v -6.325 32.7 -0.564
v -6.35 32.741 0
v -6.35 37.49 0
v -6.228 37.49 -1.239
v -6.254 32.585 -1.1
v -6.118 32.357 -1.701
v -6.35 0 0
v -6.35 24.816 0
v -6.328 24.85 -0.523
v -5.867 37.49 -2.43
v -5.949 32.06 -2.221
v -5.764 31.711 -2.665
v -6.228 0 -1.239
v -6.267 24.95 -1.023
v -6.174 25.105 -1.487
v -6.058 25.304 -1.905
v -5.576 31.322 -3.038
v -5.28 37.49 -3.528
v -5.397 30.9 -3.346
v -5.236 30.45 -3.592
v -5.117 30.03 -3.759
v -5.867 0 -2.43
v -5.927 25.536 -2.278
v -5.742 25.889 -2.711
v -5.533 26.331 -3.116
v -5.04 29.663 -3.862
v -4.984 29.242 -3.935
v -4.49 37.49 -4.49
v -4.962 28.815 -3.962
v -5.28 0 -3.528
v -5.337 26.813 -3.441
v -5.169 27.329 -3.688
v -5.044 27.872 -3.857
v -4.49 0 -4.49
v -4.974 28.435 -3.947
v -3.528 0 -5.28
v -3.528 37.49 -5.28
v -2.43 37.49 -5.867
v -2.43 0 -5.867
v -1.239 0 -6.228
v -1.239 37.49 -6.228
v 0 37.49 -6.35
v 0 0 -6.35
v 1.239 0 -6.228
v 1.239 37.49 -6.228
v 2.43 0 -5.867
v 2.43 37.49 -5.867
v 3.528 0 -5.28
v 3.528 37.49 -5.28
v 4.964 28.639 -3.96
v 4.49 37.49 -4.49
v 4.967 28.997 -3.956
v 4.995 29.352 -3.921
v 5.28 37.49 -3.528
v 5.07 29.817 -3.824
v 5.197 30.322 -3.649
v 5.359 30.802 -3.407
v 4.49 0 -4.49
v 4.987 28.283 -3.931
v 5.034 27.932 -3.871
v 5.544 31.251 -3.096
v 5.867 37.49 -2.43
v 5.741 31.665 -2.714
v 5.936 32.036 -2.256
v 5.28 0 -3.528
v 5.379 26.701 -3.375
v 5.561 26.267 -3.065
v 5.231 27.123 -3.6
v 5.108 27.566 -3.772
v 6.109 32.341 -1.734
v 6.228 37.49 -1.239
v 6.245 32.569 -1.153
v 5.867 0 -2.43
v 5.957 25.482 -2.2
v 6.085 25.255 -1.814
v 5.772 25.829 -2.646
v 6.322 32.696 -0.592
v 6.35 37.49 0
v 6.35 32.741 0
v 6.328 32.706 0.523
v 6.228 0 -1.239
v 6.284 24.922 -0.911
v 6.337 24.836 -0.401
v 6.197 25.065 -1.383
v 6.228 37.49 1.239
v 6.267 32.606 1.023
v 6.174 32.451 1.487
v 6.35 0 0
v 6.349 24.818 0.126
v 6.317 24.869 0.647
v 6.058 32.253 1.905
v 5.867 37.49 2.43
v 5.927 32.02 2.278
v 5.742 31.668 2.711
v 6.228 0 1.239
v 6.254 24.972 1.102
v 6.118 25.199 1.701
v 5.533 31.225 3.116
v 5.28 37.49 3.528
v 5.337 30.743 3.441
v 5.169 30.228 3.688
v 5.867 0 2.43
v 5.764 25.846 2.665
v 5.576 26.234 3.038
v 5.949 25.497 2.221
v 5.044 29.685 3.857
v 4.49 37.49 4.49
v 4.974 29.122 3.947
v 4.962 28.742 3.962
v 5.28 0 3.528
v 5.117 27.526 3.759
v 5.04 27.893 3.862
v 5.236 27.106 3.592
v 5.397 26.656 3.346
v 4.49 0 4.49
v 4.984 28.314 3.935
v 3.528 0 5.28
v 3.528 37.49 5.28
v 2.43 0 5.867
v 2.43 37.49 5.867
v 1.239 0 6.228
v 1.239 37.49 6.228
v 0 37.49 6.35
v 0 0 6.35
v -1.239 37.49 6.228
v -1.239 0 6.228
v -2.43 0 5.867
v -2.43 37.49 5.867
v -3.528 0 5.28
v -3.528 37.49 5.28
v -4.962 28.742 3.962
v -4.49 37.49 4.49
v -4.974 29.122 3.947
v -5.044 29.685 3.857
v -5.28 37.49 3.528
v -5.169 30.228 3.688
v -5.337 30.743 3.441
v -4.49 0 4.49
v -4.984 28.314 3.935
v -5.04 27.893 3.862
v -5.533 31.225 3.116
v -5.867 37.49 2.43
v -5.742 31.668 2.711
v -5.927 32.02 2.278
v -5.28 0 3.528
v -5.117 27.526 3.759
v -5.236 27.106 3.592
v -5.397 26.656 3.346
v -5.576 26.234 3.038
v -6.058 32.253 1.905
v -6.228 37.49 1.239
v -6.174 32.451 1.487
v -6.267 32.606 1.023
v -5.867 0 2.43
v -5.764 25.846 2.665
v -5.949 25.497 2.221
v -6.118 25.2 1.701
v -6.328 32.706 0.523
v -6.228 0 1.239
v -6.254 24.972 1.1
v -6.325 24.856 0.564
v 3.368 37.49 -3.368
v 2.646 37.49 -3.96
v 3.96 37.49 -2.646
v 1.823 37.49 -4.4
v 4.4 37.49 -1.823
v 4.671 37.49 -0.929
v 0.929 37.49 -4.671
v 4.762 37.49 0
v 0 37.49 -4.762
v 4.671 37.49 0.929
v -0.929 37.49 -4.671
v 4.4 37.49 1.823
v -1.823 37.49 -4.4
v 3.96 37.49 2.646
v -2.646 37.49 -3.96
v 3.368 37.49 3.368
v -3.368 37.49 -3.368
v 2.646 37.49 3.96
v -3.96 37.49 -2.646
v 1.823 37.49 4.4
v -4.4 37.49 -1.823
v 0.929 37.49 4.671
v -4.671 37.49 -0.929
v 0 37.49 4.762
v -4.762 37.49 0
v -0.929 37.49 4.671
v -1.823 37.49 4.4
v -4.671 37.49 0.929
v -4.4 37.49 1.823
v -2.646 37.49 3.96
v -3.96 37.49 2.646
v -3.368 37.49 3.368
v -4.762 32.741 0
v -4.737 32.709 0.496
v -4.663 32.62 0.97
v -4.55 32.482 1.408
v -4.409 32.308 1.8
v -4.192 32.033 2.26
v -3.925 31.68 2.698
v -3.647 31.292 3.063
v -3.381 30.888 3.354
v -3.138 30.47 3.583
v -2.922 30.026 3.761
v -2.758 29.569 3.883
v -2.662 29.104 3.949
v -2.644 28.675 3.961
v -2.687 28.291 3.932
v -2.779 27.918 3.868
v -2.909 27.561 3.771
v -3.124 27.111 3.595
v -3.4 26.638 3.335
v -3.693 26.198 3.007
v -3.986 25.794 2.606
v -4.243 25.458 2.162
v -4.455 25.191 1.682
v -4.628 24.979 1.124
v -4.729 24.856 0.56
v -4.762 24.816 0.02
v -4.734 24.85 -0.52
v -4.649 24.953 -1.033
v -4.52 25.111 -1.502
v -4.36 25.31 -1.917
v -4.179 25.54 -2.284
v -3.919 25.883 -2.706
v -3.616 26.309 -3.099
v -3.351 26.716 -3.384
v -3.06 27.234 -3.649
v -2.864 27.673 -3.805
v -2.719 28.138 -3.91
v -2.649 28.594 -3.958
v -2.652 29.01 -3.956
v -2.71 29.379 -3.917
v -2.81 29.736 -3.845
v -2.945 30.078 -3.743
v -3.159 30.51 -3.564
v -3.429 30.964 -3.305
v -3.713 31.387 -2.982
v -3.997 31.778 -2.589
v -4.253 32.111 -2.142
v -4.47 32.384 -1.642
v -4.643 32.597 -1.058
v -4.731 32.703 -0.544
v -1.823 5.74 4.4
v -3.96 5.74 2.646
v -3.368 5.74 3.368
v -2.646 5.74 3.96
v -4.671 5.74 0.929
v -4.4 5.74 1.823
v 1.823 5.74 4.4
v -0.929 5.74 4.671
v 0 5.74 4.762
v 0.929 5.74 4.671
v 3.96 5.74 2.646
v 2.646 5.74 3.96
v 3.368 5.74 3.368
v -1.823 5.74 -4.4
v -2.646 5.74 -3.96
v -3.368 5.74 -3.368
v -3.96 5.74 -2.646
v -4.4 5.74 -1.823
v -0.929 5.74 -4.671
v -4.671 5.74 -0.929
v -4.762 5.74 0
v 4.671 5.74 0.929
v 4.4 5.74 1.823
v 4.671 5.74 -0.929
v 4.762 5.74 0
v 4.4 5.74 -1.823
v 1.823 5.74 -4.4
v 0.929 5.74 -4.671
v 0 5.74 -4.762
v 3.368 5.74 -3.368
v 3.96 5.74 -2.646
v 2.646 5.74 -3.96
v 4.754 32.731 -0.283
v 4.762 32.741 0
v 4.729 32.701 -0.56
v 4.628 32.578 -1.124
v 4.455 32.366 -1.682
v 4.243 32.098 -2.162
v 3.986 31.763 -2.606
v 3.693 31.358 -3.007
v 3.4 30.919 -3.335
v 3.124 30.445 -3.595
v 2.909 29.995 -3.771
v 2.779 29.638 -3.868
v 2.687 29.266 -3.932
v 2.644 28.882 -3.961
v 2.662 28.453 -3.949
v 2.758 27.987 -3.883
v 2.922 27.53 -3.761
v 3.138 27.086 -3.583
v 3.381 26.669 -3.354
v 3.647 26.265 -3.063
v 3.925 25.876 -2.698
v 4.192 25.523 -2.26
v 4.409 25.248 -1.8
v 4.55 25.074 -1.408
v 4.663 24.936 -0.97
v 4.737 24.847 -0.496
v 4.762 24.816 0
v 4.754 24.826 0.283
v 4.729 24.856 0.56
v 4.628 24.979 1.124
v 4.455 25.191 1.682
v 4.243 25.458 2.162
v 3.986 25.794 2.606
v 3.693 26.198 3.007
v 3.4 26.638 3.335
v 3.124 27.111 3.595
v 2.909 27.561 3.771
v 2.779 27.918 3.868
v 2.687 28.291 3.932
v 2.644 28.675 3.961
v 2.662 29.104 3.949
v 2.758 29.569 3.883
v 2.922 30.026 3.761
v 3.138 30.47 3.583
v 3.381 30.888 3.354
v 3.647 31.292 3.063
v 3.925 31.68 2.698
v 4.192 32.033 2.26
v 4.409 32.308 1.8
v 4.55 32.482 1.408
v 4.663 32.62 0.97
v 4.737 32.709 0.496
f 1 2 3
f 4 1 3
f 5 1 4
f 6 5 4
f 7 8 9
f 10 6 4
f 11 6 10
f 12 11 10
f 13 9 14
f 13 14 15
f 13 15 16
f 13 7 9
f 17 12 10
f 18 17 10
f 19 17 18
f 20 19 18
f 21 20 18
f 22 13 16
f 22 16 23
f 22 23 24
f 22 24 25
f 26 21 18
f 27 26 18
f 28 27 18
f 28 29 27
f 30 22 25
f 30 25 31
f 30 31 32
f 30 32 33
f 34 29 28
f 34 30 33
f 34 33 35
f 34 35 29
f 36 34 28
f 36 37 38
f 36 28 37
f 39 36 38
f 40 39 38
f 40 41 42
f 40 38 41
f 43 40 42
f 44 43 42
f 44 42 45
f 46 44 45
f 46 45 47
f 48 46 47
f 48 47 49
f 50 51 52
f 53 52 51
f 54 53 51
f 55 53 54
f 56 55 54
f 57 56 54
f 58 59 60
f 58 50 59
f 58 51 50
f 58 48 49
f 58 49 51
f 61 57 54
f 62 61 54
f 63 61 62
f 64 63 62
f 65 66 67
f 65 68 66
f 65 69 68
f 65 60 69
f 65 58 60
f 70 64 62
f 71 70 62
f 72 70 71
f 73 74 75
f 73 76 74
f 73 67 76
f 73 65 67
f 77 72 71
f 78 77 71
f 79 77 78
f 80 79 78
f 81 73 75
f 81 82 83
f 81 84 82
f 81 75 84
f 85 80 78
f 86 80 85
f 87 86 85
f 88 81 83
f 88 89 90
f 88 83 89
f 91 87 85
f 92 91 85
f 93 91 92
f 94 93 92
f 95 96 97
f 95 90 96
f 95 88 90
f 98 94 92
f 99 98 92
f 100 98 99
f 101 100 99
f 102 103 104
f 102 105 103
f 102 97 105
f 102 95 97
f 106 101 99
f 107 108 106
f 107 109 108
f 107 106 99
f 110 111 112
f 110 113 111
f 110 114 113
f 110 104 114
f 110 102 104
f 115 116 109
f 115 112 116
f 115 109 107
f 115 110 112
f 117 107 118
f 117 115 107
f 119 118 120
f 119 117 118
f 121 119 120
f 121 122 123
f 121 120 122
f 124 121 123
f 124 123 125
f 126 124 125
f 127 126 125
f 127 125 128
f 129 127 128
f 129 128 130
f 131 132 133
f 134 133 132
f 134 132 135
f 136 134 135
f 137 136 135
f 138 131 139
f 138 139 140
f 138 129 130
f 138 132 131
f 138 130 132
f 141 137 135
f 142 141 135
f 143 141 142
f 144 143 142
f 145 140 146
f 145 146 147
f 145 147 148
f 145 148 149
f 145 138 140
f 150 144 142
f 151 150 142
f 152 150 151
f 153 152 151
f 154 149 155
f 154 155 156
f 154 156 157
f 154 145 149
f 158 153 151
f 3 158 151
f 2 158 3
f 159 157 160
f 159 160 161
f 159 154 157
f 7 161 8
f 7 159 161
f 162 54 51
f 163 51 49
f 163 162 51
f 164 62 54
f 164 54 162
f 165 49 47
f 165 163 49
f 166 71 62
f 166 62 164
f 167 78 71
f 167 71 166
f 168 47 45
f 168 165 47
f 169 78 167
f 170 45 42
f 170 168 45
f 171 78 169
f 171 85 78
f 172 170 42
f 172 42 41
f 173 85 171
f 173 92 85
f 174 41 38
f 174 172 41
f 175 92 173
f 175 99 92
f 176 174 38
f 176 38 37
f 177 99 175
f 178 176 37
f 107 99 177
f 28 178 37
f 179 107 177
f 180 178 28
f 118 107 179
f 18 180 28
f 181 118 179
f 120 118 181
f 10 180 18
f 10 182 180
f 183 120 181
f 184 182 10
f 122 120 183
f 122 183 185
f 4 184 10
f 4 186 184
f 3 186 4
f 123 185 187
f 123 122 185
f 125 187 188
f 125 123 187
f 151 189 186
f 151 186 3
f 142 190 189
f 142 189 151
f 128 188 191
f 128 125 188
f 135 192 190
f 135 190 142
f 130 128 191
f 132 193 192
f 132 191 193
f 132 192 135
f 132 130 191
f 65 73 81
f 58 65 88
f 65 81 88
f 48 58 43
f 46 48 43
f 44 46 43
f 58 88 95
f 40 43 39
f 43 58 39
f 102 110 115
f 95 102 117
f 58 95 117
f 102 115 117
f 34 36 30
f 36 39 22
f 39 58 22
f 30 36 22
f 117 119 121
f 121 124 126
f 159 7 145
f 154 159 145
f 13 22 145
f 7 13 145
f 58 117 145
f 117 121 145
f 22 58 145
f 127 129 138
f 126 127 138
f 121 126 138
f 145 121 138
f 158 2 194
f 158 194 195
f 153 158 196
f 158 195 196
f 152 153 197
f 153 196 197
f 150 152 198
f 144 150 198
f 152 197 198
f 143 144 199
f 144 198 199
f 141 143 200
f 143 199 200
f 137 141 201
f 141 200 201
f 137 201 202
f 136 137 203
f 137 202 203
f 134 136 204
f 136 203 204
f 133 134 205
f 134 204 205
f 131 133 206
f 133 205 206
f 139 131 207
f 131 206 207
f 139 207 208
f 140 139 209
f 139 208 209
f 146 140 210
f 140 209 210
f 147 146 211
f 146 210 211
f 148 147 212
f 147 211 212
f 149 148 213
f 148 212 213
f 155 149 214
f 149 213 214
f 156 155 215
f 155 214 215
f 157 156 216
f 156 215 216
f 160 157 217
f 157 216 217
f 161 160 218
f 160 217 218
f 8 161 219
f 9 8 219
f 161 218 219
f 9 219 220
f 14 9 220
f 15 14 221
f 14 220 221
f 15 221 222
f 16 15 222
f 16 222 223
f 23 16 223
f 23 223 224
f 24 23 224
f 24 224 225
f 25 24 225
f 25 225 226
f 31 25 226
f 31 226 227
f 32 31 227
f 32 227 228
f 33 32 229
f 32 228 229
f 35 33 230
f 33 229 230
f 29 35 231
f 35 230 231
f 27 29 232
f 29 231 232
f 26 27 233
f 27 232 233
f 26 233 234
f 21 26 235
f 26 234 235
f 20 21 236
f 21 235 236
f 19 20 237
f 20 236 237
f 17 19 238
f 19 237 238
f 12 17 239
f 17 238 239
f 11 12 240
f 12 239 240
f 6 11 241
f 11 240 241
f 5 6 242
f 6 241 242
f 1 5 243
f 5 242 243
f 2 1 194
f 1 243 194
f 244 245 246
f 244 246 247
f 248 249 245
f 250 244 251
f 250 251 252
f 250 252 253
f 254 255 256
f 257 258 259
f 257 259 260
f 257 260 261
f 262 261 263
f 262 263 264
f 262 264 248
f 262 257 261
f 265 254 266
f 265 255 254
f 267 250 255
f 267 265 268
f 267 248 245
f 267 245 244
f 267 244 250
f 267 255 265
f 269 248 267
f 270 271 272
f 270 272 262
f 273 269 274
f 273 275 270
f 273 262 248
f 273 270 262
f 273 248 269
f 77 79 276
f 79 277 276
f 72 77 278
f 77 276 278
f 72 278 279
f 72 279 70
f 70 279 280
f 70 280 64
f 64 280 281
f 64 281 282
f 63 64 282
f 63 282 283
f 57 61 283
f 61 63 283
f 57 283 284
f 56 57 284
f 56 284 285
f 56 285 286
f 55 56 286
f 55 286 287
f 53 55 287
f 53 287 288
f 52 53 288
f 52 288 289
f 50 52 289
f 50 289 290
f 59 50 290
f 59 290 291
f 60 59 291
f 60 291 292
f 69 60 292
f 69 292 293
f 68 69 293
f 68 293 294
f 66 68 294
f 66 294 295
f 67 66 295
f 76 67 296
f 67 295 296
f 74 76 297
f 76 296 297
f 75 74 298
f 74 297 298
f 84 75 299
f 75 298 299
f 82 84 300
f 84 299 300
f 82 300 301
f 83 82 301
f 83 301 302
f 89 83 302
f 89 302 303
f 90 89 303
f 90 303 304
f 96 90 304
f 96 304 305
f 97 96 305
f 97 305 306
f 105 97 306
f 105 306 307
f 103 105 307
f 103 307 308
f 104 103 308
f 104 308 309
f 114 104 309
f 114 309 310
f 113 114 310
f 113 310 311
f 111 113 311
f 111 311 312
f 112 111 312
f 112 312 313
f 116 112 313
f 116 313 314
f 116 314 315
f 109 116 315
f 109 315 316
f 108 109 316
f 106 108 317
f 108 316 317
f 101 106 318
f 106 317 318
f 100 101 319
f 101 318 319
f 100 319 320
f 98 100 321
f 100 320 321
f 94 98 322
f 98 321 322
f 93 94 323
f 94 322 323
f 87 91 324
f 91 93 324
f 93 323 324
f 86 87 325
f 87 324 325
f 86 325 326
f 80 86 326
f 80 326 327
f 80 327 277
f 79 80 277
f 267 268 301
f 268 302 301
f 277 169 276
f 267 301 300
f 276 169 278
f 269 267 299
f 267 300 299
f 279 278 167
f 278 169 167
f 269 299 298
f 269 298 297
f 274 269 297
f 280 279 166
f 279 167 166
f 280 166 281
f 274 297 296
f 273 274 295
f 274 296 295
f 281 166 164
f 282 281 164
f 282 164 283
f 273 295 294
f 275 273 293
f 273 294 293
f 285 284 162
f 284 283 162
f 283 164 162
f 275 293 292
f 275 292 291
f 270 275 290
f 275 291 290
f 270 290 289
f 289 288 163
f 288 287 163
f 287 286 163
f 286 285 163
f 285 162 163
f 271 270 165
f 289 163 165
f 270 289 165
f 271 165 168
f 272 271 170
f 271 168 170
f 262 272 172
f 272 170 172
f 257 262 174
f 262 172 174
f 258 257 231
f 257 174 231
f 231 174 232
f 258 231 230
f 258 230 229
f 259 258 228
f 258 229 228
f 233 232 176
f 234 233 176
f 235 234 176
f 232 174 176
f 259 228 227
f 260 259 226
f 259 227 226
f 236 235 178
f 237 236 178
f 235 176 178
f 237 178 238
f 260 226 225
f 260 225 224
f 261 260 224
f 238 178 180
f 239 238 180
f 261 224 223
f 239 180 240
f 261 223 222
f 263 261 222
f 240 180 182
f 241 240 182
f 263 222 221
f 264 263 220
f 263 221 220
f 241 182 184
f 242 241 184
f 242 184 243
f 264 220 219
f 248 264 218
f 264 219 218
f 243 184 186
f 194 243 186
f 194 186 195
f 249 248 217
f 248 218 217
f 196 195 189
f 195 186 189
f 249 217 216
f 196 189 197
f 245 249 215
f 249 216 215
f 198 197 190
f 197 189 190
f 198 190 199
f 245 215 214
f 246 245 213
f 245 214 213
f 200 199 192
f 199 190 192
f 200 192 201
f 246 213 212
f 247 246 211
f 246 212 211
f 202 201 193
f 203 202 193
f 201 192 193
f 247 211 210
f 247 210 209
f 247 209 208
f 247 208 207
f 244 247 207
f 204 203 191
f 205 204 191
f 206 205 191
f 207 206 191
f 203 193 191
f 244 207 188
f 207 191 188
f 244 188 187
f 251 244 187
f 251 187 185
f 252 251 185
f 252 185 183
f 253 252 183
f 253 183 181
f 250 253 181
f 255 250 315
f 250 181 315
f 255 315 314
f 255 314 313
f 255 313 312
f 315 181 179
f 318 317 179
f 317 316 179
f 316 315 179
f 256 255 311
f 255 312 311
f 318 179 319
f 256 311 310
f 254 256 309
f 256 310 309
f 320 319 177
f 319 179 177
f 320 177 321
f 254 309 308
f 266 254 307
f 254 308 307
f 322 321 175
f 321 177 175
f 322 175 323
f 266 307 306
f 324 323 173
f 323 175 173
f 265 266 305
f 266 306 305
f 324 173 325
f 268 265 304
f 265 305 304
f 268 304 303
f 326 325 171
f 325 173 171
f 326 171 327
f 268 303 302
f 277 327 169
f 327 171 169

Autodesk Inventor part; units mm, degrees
ref_plane "YZ Plane" through (0, 0, 0) normal (1, 0, 0) x (0, 1, 0)
ref_plane "XZ Plane" through (0, 0, 0) normal (0, 1, 0) x (-1, 0, 0)
ref_plane "XY Plane" through (0, 0, 0) normal (0, 0, 1) x (1, 0, 0)
sketch "Sketch1" plane through (0, 0, 0) normal (0, 1, 0) x (-1, 0, 0)
  circle A0 centre (0, 0) radius 6.35
  dimension "d0" = 12.7
extrude "Extrusion1" add sketch "Sketch1" along normal blind 37.4904
sketch "Sketch3" plane through (0, 37.4904, 0) normal (0, 1, 0) x (1, 0, 0)
  circle A0 centre (0, 0) radius 4.7625
  dimension "d10" = 9.525
extrude "Extrusion3" cut sketch "Sketch3" against normal blind 31.75
sketch "Sketch4" plane through (0, 0, 0) normal (1, 0, 0) x (0, 1, 0)
  line L0 (37.4904, -6.35) -> (37.4904, 6.35) projected
  line L1 (0, -6.35) -> (37.4904, -6.35) projected
  line L2 (0, 6.35) -> (37.4904, 6.35) projected
  line L3 (0, 6.35) -> (0, -6.35) projected
  circle A0 centre (28.7782, 0) radius 3.9624
  point P0 (0, 0)
  dimension "d13" = 7.9248
  dimension "d14" = 28.7782
  dimension "d15" = 6.35
extrude "Extrusion4" cut sketch "Sketch4" along normal mid plane 25.4 contours A0
properties part number "Piston"
